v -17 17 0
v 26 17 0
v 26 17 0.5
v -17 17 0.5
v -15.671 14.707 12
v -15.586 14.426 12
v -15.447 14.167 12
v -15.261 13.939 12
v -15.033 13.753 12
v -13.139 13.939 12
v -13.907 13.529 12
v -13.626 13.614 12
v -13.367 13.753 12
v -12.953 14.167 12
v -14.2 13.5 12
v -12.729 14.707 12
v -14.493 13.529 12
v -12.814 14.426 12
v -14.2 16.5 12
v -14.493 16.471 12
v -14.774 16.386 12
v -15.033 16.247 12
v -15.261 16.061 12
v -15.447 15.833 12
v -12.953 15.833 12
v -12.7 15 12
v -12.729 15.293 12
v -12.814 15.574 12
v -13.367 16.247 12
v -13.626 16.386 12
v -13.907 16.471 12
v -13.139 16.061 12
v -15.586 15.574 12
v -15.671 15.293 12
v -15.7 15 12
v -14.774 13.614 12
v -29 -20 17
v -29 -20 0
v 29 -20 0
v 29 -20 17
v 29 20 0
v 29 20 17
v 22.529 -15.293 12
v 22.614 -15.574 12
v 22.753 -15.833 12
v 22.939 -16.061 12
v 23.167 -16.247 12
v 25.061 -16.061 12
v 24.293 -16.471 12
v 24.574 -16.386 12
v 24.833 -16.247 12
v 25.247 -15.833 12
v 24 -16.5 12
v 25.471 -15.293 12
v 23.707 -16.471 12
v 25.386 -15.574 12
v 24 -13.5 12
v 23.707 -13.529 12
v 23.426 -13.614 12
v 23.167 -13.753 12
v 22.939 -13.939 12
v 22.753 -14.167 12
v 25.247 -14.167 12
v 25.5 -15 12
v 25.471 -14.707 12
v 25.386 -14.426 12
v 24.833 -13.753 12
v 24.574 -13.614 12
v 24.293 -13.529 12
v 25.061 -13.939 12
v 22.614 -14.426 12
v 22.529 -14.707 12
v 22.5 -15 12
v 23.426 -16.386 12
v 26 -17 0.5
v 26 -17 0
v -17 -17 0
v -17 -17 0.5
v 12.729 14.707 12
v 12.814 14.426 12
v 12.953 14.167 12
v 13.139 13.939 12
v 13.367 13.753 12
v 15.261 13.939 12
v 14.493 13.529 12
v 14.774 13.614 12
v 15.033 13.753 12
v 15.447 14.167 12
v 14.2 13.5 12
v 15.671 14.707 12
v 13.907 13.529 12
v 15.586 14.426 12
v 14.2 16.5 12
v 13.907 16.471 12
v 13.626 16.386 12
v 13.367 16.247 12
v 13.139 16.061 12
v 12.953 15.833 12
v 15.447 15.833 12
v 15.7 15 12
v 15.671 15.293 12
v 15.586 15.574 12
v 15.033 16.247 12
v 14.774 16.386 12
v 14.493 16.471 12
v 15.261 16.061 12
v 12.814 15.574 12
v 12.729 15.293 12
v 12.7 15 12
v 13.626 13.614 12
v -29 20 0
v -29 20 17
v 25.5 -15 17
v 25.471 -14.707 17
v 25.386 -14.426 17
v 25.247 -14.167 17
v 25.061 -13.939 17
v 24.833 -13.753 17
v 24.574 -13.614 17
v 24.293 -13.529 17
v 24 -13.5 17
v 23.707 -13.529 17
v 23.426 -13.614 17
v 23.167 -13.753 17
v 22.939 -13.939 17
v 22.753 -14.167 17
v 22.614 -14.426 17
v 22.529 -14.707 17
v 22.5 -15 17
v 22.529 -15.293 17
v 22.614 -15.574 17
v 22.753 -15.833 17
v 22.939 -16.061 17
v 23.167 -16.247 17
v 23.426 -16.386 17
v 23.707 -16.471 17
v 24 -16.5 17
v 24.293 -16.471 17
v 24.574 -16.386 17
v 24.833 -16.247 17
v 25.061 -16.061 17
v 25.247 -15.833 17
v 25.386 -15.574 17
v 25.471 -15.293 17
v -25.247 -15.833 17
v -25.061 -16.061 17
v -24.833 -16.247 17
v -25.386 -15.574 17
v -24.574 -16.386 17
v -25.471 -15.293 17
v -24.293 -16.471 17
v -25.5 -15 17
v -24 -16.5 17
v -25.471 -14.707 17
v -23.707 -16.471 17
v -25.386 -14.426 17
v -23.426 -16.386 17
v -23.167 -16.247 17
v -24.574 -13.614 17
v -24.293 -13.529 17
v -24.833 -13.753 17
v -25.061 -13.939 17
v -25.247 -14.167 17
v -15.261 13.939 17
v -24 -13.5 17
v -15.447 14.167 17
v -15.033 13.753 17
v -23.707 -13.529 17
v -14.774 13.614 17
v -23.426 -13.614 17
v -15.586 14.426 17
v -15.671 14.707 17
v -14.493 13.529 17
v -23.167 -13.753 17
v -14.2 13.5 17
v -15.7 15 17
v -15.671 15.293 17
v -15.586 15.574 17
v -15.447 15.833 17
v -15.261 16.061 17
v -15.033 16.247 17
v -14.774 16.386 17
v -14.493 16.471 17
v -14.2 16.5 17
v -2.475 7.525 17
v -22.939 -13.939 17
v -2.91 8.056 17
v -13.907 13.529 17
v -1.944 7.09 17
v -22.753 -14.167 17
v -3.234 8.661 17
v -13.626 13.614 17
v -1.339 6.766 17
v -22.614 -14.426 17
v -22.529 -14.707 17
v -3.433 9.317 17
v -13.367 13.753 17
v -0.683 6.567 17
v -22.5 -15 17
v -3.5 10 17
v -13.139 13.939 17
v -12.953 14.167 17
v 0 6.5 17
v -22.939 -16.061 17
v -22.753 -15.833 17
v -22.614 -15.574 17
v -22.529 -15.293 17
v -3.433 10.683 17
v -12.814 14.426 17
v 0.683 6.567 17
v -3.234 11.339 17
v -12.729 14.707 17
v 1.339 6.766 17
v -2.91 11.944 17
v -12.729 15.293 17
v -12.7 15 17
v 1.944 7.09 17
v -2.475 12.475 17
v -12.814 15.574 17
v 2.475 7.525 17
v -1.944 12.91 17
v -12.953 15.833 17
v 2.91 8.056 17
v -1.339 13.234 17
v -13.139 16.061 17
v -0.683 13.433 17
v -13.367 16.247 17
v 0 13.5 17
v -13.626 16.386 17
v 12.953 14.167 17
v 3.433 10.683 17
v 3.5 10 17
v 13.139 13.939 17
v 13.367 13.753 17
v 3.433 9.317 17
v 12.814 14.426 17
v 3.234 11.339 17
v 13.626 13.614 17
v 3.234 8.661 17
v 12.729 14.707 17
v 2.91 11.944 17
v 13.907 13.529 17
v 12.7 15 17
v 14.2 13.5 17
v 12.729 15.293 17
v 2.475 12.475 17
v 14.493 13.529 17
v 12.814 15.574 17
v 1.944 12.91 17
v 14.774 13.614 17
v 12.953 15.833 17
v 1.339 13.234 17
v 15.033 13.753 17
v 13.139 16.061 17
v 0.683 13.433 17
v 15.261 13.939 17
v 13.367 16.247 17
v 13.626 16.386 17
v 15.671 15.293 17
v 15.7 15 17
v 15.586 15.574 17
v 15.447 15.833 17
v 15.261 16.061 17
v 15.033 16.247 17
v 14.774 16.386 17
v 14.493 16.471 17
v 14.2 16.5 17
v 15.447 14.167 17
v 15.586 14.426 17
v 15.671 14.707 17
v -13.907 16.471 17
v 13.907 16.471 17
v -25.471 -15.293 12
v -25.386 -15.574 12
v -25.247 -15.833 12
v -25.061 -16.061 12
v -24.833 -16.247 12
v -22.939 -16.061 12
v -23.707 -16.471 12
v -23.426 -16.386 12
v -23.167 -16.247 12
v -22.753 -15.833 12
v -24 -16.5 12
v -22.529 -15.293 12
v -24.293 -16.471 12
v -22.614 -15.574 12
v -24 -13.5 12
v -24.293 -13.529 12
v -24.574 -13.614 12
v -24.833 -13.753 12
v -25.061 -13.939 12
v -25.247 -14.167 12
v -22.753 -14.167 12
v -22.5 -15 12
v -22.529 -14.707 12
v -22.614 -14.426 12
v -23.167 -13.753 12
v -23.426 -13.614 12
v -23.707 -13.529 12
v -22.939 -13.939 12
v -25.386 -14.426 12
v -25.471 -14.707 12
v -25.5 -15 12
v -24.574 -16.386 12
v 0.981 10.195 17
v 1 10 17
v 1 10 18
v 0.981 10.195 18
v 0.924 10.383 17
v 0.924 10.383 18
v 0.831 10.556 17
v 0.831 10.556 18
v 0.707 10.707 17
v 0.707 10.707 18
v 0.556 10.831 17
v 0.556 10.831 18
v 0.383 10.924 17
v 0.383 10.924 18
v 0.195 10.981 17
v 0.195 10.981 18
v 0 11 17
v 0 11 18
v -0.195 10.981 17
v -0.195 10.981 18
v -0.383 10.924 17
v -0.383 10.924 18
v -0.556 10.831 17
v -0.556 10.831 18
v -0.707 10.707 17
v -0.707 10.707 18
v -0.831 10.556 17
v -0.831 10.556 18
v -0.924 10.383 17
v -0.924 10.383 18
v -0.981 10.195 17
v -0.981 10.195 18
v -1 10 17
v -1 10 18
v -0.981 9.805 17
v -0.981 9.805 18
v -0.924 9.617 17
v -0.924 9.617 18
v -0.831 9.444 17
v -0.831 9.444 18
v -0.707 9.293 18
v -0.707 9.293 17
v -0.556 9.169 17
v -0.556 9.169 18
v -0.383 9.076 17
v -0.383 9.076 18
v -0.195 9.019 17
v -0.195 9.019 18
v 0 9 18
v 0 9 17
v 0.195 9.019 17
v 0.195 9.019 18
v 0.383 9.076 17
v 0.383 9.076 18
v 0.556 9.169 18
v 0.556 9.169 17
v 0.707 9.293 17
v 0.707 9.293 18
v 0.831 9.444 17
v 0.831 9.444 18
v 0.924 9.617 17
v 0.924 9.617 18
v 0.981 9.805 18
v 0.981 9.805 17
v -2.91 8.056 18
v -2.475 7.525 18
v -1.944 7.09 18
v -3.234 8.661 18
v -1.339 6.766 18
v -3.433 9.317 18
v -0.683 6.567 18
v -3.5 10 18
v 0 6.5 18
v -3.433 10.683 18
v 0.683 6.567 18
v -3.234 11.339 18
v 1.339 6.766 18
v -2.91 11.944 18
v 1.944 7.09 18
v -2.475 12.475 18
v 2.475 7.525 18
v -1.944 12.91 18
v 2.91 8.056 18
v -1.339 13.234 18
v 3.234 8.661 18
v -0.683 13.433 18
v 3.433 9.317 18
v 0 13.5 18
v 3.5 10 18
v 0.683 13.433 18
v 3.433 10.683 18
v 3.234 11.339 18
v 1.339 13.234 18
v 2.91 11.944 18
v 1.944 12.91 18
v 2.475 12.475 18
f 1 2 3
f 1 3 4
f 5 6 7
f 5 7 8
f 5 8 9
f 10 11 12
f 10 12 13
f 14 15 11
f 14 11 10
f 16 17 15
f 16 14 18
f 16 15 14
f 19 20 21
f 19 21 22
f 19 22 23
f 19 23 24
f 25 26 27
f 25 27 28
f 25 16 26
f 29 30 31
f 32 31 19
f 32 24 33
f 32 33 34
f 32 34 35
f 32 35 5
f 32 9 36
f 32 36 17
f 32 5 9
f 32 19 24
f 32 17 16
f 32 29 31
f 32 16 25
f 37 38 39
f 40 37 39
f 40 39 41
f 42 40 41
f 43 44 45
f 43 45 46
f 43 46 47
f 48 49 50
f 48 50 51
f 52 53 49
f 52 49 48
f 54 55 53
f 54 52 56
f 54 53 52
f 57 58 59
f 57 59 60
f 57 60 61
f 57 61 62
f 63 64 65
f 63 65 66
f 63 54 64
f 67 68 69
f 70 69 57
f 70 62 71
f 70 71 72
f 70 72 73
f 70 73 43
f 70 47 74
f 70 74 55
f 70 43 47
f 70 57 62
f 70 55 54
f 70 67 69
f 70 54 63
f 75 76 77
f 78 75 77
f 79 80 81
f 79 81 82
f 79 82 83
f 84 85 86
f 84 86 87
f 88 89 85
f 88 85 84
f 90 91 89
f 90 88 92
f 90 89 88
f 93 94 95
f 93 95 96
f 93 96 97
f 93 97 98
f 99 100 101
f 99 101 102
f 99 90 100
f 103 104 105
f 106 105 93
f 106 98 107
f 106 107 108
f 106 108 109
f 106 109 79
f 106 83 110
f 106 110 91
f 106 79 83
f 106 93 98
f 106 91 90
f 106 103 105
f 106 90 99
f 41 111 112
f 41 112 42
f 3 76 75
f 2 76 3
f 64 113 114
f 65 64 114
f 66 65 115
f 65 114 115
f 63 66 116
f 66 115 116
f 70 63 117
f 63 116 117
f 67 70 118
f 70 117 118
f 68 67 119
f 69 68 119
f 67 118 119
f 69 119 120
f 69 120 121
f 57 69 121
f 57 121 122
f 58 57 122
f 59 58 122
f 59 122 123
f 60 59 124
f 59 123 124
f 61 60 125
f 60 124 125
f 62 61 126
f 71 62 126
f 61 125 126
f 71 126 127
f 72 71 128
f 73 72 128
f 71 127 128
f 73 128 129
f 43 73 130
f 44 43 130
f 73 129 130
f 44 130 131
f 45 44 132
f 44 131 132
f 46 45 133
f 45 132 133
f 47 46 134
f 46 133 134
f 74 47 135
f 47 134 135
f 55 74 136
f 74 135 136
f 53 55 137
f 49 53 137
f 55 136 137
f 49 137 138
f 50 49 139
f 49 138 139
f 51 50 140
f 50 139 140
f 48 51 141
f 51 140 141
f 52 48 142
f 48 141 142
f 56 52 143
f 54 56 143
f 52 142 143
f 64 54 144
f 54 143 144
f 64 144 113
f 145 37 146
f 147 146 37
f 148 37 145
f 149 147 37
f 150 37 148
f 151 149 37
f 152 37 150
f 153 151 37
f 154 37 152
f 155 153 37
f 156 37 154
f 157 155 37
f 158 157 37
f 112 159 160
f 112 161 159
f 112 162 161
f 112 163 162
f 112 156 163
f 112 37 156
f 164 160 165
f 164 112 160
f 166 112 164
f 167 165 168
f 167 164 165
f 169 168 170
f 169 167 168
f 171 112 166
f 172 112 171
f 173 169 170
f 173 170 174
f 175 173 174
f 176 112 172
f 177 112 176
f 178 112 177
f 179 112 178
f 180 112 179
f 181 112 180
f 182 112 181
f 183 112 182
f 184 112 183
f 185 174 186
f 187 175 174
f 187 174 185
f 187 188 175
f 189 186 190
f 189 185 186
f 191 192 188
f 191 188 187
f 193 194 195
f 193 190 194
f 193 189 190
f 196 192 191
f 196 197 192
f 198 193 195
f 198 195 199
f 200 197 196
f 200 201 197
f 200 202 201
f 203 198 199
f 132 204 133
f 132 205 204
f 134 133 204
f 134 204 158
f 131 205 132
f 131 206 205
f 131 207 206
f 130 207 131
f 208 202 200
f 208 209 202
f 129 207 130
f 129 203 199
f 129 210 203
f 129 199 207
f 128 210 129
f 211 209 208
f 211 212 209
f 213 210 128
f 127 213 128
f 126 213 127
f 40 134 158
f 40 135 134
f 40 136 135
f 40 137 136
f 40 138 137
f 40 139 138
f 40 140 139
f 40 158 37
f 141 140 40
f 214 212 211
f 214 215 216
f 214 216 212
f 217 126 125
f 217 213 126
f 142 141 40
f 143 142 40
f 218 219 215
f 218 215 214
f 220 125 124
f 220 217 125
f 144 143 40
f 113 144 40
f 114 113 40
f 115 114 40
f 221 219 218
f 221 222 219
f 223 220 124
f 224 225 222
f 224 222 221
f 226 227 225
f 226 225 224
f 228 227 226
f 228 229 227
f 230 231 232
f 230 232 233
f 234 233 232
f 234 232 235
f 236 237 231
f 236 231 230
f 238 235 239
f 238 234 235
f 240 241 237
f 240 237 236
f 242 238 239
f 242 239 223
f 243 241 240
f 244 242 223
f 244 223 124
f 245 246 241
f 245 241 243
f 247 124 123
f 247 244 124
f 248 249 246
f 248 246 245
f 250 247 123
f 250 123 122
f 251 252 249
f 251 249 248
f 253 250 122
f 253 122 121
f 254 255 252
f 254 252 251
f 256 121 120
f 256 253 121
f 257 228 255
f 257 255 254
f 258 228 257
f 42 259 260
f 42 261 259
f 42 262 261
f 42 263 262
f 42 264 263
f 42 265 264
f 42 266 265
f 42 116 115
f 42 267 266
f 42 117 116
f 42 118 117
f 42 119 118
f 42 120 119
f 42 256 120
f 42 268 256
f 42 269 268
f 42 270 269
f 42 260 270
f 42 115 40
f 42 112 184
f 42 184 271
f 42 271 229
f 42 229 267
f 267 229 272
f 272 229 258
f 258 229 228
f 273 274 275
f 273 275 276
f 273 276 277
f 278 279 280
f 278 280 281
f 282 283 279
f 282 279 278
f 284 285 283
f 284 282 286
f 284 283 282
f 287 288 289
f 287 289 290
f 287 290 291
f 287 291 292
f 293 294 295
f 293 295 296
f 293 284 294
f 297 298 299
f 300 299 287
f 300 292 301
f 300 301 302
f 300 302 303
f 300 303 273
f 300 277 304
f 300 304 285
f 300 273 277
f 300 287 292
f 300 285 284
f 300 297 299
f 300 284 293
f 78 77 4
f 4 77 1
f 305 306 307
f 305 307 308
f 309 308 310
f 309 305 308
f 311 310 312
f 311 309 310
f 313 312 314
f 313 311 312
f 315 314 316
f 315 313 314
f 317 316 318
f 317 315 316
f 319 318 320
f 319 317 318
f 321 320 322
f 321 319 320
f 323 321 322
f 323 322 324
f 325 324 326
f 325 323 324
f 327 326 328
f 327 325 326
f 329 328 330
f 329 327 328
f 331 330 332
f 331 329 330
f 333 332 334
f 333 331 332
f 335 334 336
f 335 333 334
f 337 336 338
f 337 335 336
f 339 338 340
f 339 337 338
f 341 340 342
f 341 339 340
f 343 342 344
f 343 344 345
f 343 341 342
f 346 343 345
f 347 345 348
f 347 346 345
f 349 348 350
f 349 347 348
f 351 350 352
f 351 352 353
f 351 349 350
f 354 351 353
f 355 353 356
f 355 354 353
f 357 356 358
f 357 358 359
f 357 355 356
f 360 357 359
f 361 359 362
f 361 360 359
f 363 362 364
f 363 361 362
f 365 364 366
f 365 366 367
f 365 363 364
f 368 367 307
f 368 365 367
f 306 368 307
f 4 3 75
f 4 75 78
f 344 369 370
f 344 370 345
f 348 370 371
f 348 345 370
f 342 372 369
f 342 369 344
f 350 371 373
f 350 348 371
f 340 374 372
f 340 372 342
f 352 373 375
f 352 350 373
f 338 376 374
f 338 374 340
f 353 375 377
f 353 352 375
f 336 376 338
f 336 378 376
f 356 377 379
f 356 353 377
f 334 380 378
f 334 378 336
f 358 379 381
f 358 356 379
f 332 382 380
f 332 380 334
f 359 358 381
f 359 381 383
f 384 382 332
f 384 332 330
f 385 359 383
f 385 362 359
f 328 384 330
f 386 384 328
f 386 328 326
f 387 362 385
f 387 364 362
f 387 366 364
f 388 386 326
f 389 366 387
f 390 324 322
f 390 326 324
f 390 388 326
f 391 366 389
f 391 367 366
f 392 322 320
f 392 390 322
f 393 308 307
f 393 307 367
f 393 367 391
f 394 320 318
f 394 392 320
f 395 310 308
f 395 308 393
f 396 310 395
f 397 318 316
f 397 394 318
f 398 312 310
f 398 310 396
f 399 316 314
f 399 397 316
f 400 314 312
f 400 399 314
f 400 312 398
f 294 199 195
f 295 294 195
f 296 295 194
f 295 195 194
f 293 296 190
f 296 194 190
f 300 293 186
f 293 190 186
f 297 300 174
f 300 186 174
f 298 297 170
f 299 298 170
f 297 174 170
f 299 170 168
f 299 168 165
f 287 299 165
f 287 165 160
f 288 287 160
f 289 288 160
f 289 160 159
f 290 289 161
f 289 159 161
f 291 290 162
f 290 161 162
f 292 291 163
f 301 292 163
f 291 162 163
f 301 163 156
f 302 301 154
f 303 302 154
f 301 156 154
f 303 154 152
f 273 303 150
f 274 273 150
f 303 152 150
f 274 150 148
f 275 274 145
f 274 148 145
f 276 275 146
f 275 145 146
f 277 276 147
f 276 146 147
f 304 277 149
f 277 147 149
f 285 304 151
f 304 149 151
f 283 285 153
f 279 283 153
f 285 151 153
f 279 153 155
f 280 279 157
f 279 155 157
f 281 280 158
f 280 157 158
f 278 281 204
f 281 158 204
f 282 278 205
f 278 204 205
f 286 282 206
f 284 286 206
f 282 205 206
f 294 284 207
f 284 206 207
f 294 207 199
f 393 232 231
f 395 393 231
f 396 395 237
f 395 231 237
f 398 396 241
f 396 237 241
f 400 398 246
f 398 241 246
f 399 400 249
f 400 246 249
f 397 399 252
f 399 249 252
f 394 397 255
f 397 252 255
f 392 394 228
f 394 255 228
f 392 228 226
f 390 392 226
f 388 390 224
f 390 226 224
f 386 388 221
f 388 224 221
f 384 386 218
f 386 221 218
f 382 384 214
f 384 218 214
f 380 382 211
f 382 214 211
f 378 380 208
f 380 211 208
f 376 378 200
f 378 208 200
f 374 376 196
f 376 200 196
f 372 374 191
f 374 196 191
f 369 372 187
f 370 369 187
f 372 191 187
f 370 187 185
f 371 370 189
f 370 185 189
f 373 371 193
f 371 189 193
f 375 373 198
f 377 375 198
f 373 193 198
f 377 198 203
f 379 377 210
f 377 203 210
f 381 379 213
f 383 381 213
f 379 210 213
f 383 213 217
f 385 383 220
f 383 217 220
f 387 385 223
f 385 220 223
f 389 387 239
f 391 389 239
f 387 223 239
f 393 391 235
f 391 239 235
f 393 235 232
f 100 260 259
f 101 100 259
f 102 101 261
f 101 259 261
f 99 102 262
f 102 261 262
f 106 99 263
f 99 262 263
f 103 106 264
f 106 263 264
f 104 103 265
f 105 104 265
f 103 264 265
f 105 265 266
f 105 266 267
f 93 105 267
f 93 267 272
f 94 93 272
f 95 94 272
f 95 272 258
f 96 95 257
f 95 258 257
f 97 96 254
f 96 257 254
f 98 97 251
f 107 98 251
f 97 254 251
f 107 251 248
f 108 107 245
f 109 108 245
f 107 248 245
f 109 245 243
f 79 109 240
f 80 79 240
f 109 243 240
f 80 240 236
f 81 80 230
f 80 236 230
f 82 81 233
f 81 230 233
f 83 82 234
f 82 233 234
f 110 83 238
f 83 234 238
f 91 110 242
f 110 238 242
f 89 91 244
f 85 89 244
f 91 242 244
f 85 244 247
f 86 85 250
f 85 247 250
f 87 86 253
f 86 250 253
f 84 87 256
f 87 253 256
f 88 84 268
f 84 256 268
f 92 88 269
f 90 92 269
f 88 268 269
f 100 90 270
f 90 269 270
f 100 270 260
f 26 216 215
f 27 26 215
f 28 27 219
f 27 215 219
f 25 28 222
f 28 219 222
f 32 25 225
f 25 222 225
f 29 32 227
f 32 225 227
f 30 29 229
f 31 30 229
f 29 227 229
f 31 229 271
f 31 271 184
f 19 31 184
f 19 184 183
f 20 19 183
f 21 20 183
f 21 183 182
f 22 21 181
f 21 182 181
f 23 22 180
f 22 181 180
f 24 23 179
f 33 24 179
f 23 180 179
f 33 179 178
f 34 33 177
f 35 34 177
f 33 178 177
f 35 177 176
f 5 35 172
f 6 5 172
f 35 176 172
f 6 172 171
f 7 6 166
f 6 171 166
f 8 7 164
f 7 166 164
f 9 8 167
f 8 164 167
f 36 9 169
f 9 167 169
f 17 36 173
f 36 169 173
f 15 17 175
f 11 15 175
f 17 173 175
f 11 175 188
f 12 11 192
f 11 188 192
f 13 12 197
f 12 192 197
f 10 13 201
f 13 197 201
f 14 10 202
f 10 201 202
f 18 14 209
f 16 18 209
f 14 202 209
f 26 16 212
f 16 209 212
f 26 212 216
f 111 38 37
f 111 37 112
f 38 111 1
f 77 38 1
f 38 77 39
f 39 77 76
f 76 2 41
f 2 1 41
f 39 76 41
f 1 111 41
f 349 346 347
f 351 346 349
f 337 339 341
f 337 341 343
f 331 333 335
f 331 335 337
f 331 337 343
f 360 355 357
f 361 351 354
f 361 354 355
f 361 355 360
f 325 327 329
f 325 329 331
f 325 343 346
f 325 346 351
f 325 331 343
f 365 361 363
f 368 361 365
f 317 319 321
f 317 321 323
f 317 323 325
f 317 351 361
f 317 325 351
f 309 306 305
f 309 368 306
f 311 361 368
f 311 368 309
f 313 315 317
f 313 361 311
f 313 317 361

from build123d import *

# Parameters (mm, degrees)
SKETCH_1_W          = 58
SKETCH_1_H          = 40
EXTRUDE_1_DEPTH     = 17
SKETCH_2_R          = 1.5
CUT_EXTRUDE_1_DEPTH = 5
SKETCH_3_W          = 43
SKETCH_3_H          = 34
CUT_EXTRUDE_2_DEPTH = 0.5
SKETCH_4_R          = 3.5
SKETCH_4_R_2        = 1
EXTRUDE_2_DEPTH     = 1


with BuildPart() as part:
    # 草图1 → 凸台-拉伸1 (new body)
    with BuildSketch(Plane.XY):
        Rectangle(SKETCH_1_W, SKETCH_1_H)
    extrude(amount=EXTRUDE_1_DEPTH)

    # 草图2 → 切除-拉伸1 (cut)
    with BuildSketch(Plane.XY.offset(17)):
        with Locations((-24, -15)):
            Circle(SKETCH_2_R)
        with Locations((24, -15)):
            Circle(SKETCH_2_R)
        with Locations((-14.2, 15)):
            Circle(SKETCH_2_R)
        with Locations((14.2, 15)):
            Circle(SKETCH_2_R)
    extrude(amount=-CUT_EXTRUDE_1_DEPTH, mode=Mode.SUBTRACT)

    # 草图3 → 切除-拉伸2 (cut)
    with BuildSketch(Plane(origin=(0, 0, 0), x_dir=(-1, 0, 0), z_dir=(0, 0, -1))):
        with Locations((-4.5, 0)):
            Rectangle(SKETCH_3_W, SKETCH_3_H)
    extrude(amount=-CUT_EXTRUDE_2_DEPTH, mode=Mode.SUBTRACT)

    # 草图4 → 凸台-拉伸2 (add)
    with BuildSketch(Plane.XY.offset(17)):
        with Locations((0, 10)):
            Circle(SKETCH_4_R)
        with Locations((0, 10)):
            Circle(SKETCH_4_R_2, mode=Mode.SUBTRACT)
    extrude(amount=EXTRUDE_2_DEPTH)


solid = part.part
